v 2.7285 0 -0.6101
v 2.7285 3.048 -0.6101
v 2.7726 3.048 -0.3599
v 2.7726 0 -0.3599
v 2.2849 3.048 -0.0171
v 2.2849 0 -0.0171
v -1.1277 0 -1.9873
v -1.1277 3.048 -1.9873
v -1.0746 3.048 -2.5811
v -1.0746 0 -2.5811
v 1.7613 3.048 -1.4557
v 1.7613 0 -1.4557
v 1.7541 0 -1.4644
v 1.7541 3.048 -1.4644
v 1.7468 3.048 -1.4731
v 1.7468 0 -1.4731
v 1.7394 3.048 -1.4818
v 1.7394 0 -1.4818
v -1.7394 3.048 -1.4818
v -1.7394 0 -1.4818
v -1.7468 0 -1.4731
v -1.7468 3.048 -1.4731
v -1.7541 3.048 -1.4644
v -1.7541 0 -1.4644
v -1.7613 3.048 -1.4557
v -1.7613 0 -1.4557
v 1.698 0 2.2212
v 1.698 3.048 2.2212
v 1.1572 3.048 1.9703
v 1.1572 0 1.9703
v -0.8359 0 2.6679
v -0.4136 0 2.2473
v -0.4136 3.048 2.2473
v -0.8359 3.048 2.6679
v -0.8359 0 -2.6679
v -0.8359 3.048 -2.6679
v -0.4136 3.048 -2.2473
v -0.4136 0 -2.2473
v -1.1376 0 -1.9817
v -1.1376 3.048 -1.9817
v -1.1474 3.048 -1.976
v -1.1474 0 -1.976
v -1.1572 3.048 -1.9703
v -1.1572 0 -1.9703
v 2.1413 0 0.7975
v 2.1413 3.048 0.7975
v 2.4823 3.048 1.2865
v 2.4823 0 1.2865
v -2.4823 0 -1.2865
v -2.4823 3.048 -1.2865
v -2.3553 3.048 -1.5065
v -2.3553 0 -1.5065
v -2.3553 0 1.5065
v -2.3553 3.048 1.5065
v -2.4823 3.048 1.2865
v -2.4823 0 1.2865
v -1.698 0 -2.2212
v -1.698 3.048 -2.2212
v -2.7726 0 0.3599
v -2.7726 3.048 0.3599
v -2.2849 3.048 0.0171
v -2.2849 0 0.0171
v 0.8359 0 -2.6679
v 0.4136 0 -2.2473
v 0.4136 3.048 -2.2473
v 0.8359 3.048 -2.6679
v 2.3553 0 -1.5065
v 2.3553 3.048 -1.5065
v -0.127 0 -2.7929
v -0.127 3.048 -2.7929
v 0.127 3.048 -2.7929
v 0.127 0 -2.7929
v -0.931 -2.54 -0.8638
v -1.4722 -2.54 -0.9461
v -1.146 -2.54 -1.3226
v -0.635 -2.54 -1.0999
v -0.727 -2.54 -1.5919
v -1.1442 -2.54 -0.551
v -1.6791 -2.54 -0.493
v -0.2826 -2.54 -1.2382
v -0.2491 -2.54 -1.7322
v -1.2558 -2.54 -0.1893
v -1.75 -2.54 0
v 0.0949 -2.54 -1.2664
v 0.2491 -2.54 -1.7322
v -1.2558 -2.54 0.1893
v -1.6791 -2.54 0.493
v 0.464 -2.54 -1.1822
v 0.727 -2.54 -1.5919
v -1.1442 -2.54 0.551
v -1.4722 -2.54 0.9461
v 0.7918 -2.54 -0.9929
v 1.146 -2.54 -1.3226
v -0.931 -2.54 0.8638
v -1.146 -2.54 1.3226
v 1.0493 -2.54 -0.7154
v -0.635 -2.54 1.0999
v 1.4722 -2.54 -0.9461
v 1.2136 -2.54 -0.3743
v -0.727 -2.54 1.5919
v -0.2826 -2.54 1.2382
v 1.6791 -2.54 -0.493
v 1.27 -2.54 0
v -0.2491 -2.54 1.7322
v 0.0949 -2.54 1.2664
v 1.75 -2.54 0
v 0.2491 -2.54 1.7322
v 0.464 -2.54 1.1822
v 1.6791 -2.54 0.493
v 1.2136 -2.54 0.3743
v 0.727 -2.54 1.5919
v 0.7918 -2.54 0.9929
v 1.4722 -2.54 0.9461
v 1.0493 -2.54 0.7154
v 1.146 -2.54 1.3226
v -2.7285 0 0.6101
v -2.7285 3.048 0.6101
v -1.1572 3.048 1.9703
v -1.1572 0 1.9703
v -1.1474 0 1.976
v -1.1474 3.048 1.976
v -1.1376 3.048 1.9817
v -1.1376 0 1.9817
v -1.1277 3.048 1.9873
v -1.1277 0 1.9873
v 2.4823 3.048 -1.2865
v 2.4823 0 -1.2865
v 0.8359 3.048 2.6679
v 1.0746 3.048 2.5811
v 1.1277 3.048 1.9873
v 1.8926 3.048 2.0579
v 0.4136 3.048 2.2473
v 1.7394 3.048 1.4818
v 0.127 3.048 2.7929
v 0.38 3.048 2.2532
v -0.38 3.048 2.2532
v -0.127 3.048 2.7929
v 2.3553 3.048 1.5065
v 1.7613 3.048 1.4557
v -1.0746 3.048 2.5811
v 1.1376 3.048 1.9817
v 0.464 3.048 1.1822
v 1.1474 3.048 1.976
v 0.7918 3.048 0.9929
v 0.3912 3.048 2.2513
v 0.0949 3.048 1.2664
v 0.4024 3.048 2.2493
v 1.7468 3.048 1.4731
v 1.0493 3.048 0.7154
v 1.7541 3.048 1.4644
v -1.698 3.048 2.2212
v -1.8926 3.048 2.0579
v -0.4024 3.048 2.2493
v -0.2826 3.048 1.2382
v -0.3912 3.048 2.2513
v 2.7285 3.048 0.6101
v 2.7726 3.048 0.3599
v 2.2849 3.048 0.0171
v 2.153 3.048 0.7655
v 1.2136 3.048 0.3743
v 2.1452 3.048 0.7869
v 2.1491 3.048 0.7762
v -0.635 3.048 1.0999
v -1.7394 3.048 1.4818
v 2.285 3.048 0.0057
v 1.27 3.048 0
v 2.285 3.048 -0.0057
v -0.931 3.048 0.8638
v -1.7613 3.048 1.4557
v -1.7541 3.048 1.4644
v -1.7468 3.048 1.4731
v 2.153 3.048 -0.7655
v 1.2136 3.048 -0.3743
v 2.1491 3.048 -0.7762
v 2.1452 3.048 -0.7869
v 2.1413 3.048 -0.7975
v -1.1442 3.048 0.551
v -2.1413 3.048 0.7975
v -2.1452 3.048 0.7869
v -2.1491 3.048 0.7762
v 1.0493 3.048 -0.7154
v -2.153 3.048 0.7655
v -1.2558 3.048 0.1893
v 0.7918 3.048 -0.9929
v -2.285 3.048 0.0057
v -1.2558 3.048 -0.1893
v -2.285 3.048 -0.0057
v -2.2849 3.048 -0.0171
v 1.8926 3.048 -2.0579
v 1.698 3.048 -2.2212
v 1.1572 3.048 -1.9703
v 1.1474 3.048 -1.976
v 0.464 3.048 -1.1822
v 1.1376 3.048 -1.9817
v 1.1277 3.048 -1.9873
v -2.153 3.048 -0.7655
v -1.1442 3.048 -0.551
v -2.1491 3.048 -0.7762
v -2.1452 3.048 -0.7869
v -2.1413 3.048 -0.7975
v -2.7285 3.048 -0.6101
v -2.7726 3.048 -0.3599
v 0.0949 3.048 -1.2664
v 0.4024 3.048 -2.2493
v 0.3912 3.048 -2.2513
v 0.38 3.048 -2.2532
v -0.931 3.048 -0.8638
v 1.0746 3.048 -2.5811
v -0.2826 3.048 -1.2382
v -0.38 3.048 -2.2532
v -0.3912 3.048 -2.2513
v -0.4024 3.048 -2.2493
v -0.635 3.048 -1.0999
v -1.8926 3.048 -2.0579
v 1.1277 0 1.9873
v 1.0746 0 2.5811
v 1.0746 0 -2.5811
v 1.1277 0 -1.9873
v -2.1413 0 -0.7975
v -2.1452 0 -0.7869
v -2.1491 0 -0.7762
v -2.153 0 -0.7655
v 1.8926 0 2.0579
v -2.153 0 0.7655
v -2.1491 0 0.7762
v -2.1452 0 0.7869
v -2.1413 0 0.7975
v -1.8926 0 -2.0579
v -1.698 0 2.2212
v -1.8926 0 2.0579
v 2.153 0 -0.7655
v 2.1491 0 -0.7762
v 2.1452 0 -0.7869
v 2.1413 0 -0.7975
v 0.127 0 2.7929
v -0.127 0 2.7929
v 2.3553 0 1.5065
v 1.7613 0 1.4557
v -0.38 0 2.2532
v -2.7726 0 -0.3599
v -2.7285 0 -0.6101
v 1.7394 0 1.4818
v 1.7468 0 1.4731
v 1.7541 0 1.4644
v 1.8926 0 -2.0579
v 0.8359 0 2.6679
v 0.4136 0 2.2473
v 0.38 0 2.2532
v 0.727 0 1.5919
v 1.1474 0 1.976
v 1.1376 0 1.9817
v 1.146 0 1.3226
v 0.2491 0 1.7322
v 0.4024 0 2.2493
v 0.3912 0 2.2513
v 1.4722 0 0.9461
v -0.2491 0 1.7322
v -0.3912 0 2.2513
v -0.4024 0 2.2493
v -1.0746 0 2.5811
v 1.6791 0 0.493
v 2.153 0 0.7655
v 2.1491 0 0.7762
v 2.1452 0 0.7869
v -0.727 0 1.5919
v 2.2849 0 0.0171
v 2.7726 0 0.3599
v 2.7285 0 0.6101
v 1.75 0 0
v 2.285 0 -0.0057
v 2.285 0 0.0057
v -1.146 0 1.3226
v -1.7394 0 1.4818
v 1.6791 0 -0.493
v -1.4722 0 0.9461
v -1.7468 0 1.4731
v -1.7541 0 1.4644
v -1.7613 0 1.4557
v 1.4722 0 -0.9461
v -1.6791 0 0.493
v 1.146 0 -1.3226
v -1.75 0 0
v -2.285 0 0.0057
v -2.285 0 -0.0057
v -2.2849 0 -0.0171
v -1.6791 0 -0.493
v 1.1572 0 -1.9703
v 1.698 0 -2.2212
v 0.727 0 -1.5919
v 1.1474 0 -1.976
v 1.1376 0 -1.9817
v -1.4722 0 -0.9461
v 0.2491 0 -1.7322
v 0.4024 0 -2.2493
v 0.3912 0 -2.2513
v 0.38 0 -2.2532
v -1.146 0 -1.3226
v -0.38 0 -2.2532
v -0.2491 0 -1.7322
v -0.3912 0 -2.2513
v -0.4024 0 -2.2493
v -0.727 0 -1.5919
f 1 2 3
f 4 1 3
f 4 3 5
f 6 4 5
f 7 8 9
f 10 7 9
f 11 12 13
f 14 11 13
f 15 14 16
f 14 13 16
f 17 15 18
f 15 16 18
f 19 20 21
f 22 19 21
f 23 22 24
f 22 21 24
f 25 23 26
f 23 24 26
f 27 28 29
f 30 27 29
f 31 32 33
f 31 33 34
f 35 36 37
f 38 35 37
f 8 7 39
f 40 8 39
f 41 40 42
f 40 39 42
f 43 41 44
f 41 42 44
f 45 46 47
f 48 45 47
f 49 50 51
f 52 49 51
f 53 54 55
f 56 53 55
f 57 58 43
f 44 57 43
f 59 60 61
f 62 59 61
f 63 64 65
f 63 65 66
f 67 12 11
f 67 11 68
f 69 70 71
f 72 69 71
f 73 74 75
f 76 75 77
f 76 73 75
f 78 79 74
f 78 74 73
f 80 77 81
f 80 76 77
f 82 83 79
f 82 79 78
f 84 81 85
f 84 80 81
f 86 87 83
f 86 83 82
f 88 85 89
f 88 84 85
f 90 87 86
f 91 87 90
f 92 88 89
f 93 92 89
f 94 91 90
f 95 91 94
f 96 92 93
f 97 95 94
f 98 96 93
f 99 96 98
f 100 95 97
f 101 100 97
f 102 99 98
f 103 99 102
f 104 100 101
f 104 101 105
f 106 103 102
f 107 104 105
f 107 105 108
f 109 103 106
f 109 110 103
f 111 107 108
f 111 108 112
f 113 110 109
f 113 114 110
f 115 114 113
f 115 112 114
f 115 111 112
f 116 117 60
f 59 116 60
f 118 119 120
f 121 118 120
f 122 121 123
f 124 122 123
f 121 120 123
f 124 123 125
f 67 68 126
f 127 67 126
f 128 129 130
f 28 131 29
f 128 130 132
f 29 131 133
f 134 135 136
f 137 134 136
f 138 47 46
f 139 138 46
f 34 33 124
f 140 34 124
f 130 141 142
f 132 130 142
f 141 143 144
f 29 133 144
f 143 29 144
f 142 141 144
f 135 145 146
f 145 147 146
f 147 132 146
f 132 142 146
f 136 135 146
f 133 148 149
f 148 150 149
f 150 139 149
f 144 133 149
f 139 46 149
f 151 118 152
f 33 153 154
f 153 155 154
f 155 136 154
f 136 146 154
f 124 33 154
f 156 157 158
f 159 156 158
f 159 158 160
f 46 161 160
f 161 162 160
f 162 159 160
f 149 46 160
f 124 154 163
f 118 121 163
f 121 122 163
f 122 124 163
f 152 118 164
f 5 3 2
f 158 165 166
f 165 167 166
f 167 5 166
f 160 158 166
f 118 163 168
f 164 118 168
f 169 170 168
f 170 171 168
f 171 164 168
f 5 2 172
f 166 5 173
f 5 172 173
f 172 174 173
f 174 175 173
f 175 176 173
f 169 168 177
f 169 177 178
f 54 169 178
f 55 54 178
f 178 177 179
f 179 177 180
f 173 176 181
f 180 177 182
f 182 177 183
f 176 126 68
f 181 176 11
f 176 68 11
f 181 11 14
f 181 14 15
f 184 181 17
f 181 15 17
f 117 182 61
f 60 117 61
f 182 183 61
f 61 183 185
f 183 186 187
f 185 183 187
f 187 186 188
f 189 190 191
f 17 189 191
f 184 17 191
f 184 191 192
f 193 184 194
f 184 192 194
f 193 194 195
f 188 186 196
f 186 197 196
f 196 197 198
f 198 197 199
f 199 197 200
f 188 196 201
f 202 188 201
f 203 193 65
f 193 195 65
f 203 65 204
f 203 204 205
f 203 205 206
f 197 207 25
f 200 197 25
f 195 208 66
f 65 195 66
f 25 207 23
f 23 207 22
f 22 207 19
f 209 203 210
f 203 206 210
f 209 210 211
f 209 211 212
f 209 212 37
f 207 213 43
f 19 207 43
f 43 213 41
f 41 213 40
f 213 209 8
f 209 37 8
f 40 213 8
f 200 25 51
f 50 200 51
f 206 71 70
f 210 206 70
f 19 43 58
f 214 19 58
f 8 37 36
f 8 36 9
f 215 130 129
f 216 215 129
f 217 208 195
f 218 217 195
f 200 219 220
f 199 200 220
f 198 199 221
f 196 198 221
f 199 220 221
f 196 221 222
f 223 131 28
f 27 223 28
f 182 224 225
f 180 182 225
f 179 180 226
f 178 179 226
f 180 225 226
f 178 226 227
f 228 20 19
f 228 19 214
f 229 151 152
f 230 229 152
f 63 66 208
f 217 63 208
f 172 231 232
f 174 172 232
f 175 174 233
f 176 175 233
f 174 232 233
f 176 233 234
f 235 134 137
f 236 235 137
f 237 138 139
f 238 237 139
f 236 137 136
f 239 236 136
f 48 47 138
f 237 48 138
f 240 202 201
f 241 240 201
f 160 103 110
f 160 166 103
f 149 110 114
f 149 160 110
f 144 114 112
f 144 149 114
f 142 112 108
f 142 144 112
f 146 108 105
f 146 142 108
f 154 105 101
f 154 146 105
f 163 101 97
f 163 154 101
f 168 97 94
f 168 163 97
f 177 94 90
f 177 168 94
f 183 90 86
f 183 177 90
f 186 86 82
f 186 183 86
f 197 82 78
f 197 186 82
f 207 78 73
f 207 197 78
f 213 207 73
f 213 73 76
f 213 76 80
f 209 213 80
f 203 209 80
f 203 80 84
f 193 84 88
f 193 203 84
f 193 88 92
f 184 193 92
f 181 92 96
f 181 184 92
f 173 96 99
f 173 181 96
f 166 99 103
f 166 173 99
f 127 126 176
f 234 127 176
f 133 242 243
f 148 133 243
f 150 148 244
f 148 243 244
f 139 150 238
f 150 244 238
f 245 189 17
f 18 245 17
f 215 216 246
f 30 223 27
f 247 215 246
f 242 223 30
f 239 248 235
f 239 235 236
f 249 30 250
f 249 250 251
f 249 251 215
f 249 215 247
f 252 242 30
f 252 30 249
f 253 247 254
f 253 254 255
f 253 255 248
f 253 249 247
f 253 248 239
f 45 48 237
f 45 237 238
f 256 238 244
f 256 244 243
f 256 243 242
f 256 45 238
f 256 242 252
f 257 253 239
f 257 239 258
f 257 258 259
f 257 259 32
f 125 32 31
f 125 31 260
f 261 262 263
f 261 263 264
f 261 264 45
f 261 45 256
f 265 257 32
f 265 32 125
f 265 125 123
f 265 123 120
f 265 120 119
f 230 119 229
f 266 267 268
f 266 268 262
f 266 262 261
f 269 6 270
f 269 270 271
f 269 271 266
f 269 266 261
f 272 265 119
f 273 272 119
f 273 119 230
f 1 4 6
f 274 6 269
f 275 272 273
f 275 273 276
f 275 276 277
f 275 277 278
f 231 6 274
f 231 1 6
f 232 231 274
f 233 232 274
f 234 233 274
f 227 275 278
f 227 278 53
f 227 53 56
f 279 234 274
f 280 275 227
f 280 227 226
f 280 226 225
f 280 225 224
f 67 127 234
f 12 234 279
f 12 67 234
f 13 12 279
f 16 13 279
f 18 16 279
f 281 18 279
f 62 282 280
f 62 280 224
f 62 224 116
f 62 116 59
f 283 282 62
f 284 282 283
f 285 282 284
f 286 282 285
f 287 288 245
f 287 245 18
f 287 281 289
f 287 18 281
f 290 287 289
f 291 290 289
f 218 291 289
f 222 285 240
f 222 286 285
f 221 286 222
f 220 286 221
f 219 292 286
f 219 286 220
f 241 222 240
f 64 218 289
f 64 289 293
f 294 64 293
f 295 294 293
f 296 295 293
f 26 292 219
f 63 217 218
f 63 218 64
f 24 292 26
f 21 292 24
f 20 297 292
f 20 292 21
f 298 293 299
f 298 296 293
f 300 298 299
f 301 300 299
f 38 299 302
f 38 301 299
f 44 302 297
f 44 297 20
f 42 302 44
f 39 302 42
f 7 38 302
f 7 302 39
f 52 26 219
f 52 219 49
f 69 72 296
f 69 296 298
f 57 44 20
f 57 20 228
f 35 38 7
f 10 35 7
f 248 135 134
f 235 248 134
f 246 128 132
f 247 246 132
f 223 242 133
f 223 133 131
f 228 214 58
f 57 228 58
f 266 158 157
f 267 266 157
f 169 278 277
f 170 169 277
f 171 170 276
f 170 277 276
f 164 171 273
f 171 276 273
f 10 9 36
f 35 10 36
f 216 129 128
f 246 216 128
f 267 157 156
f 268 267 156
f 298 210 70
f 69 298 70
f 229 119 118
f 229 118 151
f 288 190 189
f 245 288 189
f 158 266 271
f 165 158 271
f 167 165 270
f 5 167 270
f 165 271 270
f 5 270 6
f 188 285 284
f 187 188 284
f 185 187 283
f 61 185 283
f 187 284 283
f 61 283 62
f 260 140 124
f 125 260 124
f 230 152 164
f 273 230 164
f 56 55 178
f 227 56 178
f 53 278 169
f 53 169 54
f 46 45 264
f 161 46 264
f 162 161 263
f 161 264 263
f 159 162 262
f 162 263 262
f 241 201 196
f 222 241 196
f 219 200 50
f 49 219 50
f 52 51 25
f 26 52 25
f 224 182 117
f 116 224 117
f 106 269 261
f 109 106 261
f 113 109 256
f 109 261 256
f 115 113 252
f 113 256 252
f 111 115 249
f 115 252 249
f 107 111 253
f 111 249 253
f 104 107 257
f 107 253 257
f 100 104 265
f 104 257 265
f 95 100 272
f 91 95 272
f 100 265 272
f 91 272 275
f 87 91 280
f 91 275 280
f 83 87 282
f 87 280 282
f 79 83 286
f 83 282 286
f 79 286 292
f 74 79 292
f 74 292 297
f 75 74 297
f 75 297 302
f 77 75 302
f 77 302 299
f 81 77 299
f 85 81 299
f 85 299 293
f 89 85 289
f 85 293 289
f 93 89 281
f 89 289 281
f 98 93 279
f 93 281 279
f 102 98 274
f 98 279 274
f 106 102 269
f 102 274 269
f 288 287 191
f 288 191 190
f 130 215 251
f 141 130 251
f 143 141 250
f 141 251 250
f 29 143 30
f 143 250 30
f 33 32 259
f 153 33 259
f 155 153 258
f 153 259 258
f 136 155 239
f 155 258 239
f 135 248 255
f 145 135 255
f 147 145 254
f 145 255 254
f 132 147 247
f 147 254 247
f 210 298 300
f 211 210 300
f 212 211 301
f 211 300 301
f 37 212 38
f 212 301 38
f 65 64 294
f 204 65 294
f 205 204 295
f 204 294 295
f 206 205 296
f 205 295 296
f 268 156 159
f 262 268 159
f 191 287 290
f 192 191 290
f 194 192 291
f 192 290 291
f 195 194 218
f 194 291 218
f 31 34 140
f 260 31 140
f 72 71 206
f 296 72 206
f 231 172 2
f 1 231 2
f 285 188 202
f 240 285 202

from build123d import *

# Parameters (mm, degrees)
SKETCH1_R           = 2.285
SKETCH1_R_2         = 1.27
BOSS_EXTRUDE1_DEPTH = 3.048
BOSS_EXTRUDE2_DEPTH = 3.048
CIRPATTERN1_COUNT   = 18
SKETCH3_R           = 1.75
SKETCH3_R_2         = 1.27
BOSS_EXTRUDE3_DEPTH = 2.54


with BuildPart() as part:
    # Sketch1 → Boss-Extrude1 (new body)
    with BuildSketch(Plane(origin=(0, 0, 0), x_dir=(1, 0, 0), z_dir=(0, 1, 0))):
        Circle(SKETCH1_R)
        Circle(SKETCH1_R_2, mode=Mode.SUBTRACT)
    extrude(amount=BOSS_EXTRUDE1_DEPTH)

    # Sketch2 → Boss-Extrude2 (add)
    with BuildSketch(Plane(origin=(0, 3.048, 0), x_dir=(1, 0, 0), z_dir=(0, 1, 0))):
        with BuildLine():
            Line((-0.127, 2.792943956), (0.127, 2.792943956))
            Line((0.127, 2.792943956), (0.38, 2.253139456))
            ThreePointArc((0.38, 2.253139456), (0, 2.285), (-0.38, 2.253139456))
            Line((-0.38, 2.253139456), (-0.127, 2.792943956))
        make_face()
    boss_extrude2 = extrude(amount=-BOSS_EXTRUDE2_DEPTH)

    # CirPattern1: Boss-Extrude2 ×18 about axis
    cirpattern1_axis = Axis((0, 0, 0), (0, 1, 0))
    for i in range(1, CIRPATTERN1_COUNT):
        add(boss_extrude2.rotate(cirpattern1_axis, i * 360 / CIRPATTERN1_COUNT))

    # Sketch3 → Boss-Extrude3 (add)
    with BuildSketch(Plane.XZ):
        Circle(SKETCH3_R)
        Circle(SKETCH3_R_2, mode=Mode.SUBTRACT)
    extrude(amount=BOSS_EXTRUDE3_DEPTH)


solid = part.part
